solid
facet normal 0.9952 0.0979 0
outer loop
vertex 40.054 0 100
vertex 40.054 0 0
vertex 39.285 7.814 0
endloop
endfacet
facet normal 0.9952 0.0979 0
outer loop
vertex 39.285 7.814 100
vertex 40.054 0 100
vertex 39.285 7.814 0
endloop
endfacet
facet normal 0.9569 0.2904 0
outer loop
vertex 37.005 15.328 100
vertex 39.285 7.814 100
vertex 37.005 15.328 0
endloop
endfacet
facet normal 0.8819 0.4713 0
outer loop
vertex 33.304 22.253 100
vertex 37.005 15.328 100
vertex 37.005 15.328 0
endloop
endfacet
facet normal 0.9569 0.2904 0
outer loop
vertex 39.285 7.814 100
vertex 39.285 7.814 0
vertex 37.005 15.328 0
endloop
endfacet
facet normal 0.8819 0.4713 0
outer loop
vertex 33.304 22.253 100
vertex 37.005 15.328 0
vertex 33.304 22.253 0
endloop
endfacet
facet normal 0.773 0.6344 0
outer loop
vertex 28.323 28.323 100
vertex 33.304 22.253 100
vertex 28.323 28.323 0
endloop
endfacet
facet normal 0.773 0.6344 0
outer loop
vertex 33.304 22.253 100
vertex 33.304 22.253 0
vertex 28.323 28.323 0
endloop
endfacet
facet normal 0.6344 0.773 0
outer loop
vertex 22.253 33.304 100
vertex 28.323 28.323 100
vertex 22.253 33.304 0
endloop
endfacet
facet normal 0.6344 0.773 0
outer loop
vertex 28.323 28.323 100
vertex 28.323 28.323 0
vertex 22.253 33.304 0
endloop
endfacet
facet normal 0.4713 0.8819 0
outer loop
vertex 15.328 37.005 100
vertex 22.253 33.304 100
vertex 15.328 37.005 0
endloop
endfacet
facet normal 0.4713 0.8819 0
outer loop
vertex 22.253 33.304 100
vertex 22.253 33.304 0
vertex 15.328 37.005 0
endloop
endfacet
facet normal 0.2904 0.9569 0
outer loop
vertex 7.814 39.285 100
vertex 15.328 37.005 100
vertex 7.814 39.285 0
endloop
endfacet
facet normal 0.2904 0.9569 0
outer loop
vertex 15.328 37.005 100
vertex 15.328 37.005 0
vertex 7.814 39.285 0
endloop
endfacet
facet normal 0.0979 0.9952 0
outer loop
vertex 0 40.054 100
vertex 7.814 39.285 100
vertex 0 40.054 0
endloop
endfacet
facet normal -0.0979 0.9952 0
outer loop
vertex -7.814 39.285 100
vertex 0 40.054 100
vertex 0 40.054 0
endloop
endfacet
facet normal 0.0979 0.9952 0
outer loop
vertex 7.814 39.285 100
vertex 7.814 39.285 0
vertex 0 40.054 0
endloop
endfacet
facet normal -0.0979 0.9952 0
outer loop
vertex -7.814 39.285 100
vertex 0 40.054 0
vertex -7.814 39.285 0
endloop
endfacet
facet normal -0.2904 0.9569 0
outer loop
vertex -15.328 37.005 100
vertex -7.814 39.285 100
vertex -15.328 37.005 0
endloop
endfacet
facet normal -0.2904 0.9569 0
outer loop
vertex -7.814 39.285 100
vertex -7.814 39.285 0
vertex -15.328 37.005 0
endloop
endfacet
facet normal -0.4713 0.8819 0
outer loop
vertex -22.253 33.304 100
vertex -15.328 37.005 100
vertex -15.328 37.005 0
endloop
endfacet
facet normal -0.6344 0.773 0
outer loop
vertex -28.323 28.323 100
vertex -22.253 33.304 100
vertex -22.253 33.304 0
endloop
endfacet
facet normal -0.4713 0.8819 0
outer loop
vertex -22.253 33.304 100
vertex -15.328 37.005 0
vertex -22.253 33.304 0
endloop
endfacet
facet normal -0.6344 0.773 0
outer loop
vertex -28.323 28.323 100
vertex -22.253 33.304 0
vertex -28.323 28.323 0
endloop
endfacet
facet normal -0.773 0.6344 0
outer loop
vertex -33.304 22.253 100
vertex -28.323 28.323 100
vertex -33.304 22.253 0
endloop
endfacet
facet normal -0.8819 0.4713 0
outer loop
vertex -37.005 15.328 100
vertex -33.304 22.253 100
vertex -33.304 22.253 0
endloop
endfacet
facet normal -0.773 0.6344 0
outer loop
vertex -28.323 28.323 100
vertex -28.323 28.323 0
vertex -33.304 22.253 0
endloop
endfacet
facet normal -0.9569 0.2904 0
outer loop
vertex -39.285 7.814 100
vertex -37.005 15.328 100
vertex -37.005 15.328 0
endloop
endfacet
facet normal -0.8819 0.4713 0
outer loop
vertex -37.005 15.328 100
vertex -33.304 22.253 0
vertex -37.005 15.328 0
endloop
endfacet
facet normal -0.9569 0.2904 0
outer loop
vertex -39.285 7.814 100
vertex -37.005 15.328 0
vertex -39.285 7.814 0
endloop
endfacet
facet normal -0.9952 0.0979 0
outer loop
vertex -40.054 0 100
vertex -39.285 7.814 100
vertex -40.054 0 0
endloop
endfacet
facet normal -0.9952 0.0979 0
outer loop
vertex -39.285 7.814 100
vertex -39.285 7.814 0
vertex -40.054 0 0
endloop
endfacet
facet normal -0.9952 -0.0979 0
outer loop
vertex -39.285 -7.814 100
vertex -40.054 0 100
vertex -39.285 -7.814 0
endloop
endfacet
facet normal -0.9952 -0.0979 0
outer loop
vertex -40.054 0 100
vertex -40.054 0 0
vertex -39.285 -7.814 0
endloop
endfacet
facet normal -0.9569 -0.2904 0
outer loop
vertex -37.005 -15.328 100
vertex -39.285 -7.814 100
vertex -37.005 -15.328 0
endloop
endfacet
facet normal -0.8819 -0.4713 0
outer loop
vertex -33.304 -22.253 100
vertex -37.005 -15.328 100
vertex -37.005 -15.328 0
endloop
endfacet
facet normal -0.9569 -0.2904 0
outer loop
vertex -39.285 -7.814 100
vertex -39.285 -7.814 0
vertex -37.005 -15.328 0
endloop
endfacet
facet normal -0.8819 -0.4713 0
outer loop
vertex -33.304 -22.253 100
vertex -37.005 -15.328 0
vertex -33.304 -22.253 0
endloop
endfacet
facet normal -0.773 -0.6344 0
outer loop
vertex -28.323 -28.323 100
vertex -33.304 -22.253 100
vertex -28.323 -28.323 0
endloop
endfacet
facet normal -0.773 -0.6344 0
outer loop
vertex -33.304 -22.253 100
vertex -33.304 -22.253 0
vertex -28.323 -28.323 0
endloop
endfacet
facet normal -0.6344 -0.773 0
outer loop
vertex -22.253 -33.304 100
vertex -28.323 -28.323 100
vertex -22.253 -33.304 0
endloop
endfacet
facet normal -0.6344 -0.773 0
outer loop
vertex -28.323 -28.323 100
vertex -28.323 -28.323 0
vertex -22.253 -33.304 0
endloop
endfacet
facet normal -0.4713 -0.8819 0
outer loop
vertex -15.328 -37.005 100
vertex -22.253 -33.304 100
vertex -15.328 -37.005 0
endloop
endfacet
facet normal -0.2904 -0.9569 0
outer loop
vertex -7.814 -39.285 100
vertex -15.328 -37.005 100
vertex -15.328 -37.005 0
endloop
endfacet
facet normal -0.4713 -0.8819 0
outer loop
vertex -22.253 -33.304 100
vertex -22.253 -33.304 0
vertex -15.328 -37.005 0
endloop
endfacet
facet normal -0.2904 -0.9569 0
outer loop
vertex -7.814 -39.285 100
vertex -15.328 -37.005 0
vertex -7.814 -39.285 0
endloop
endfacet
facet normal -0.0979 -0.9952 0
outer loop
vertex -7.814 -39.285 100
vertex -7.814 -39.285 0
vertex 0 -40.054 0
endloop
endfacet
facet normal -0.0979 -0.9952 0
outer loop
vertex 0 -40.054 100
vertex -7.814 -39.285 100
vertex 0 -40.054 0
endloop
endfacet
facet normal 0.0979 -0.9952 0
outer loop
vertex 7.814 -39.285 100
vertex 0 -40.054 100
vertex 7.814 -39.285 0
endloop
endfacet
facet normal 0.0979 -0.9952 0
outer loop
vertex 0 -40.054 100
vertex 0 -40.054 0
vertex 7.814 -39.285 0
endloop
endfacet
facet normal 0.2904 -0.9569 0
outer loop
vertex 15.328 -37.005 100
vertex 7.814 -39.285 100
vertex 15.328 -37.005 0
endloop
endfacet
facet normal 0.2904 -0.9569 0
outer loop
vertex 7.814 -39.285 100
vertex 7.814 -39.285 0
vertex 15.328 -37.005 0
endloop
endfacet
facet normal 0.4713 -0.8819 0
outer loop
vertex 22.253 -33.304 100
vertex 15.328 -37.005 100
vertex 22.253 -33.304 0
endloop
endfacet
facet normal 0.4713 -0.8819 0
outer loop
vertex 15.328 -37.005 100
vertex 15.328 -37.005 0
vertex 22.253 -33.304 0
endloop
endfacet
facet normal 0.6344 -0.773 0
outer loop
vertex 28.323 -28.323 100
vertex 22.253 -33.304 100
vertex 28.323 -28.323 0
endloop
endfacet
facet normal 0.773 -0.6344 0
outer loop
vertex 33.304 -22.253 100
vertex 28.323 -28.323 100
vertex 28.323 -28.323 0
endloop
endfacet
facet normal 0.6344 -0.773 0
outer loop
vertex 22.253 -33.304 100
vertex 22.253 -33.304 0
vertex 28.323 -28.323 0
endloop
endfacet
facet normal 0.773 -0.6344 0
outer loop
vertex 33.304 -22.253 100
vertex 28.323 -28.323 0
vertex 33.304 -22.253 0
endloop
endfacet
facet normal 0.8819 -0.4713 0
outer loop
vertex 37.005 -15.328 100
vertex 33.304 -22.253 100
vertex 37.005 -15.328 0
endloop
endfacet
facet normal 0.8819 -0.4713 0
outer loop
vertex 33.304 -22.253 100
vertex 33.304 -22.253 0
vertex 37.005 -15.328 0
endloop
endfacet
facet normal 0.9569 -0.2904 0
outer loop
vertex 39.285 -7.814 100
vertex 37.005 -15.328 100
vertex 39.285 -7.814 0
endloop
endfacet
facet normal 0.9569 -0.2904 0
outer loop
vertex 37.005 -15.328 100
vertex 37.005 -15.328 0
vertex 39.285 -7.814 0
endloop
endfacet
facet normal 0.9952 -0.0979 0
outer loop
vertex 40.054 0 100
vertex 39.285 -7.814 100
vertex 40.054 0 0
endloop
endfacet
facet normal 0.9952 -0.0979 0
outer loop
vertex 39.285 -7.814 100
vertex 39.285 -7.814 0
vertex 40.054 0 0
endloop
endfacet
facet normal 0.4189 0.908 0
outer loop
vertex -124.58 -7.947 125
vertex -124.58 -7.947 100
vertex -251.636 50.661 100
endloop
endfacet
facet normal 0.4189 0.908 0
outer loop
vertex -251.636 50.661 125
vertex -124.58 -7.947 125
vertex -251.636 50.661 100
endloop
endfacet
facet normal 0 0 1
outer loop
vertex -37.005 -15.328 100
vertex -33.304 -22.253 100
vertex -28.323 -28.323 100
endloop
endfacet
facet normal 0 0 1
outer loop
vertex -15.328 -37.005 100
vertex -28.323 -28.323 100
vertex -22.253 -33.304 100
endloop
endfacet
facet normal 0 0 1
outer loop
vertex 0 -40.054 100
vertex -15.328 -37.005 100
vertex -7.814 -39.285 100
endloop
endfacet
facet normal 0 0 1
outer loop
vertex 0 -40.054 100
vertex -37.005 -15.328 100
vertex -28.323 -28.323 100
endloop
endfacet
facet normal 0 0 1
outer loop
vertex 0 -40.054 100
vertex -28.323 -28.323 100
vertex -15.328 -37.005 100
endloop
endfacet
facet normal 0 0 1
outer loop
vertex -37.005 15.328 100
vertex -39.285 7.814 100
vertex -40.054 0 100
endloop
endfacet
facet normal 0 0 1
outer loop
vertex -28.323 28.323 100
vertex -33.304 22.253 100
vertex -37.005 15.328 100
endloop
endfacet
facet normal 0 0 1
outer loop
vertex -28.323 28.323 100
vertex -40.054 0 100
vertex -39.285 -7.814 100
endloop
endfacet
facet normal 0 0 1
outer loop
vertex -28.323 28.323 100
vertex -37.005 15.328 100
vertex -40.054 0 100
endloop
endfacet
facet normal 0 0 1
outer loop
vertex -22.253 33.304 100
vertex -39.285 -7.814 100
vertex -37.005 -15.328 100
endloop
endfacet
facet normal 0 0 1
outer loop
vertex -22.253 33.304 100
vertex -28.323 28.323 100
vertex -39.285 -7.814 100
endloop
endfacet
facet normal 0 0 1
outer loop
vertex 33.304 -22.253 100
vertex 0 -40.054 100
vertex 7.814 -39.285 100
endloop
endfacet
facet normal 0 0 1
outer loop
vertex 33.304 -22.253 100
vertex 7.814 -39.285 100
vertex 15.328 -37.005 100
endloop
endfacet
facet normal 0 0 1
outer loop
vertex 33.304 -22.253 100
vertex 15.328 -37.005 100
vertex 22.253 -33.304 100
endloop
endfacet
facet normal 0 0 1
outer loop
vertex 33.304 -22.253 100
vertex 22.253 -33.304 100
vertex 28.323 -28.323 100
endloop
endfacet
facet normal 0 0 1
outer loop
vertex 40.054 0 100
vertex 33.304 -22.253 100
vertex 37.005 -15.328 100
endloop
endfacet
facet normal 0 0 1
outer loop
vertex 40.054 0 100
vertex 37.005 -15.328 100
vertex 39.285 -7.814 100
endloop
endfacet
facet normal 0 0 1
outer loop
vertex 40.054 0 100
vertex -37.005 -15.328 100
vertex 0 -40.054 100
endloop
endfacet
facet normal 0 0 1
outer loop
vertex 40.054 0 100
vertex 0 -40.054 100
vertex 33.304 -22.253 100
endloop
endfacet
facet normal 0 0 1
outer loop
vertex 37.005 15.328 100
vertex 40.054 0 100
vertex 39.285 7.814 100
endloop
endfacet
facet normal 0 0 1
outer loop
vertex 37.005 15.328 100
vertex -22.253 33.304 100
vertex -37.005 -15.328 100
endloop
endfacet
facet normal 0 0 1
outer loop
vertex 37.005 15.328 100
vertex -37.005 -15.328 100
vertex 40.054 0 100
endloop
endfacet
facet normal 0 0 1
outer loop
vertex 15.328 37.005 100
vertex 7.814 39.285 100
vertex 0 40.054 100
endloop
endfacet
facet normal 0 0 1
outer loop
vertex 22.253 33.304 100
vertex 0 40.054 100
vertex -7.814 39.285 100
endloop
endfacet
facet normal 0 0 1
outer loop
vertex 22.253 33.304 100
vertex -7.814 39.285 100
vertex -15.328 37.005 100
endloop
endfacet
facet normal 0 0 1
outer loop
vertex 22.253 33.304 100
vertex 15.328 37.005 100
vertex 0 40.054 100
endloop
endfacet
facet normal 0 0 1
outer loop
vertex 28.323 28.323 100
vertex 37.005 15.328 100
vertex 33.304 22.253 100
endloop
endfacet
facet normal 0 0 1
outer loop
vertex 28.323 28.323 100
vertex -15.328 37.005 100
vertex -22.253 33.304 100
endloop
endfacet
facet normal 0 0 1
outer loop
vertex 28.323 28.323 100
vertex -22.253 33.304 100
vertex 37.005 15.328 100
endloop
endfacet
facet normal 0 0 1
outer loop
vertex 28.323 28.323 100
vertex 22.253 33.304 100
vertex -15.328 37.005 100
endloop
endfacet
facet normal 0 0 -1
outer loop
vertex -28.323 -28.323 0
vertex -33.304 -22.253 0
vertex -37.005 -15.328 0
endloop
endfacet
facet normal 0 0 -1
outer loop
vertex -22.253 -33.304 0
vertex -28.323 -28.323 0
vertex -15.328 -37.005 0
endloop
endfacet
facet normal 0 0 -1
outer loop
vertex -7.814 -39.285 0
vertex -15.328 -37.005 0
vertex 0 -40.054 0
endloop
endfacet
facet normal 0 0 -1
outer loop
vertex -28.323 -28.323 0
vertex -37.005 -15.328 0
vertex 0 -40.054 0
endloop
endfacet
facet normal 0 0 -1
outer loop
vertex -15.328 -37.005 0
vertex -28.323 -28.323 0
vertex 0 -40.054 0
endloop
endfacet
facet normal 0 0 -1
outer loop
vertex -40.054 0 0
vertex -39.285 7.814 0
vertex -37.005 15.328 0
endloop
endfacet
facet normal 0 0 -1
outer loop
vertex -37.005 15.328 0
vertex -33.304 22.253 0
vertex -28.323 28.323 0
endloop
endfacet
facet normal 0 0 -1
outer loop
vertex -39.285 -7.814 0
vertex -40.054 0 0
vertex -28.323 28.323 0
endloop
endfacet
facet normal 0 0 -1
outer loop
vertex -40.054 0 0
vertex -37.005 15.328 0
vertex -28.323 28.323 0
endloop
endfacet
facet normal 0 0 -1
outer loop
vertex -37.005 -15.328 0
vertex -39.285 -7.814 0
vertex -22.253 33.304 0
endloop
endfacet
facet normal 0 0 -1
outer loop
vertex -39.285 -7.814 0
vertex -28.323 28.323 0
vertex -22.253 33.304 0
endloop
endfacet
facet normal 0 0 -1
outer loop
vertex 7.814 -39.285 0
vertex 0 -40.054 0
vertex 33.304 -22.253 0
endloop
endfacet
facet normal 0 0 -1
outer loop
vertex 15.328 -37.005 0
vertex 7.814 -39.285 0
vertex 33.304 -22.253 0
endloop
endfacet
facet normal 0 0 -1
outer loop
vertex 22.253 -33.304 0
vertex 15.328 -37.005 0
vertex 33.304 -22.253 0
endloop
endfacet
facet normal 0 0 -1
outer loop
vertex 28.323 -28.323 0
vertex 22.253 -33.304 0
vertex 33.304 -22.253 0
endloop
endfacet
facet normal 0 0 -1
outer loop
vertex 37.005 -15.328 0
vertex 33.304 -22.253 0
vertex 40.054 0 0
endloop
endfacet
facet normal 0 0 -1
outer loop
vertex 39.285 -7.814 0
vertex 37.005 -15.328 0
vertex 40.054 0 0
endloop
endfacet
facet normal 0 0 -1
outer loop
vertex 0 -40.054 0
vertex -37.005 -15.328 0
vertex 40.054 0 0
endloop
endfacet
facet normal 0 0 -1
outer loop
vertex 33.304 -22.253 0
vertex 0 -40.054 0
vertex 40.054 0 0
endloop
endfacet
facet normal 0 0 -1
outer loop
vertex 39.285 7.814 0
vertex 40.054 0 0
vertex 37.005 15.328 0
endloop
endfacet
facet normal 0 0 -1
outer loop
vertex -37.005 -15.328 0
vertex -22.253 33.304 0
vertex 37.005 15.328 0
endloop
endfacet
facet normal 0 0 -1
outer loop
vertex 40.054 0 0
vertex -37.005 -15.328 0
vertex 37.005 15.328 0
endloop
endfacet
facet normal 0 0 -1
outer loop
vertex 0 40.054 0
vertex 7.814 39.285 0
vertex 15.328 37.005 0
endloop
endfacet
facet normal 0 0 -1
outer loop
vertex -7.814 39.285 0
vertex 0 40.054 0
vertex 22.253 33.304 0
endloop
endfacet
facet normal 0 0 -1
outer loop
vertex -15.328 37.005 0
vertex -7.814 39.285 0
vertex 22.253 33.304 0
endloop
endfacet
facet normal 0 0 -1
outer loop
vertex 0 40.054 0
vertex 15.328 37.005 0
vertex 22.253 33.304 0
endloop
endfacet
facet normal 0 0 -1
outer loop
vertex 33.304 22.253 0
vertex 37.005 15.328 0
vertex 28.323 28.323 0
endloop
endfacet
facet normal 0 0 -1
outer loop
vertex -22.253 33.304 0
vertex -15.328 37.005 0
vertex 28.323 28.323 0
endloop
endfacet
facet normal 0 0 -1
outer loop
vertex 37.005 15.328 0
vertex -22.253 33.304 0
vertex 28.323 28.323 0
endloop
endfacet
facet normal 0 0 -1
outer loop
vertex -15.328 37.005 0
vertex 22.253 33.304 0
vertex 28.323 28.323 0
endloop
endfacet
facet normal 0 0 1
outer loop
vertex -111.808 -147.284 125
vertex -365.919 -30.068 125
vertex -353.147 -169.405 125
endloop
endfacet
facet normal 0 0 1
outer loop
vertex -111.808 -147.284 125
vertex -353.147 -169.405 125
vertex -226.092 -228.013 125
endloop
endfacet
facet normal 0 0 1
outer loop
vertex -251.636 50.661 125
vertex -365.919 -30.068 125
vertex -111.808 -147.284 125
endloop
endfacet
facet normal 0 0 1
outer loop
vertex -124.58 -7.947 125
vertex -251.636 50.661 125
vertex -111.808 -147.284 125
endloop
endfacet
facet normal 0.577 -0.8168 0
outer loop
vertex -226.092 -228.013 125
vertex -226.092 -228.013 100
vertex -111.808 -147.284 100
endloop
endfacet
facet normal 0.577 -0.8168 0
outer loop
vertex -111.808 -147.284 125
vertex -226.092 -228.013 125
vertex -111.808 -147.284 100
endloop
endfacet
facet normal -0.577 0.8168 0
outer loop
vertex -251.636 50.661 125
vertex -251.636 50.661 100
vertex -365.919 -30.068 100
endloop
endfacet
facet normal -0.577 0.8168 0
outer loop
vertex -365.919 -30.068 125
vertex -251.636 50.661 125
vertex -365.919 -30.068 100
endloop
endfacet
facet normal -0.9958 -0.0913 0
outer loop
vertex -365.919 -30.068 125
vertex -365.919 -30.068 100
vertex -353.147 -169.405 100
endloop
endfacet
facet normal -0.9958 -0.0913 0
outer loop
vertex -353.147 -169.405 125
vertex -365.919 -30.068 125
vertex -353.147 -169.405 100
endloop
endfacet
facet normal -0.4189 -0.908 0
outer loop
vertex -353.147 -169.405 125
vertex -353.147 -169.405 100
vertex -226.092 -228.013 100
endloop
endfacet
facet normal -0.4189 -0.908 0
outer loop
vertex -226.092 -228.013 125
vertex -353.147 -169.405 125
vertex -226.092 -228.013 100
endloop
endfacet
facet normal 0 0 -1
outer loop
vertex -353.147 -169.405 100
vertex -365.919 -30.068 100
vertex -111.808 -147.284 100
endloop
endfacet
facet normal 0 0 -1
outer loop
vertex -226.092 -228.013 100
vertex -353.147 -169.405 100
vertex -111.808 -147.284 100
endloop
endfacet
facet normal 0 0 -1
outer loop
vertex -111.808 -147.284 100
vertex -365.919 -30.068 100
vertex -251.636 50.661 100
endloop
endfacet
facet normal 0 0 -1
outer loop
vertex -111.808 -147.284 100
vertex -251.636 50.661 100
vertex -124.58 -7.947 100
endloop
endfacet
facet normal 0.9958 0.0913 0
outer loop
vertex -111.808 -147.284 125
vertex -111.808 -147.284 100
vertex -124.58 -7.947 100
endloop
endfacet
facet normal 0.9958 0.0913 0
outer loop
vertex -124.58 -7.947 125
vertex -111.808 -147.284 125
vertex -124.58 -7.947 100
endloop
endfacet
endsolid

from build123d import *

# Parameters (mm, degrees)
F0_R     = 40.054359
F1_DEPTH = 100
F4_DEPTH = 25


with BuildPart() as f1:
    # F0 (on Top) → F1 (new body)
    with BuildSketch(Plane.XY):
        Circle(F0_R)
    extrude(amount=F1_DEPTH)


with BuildPart() as f4:
    # F3 (on face) → F4 (new body)
    with BuildSketch(Plane.XY.offset(100)):
        Polygon((-365.919222, -30.067974), (-353.147447, -169.405207), (-226.091976, -228.013142), (-111.80828, -147.283843), (-124.580055, -7.94661), (-251.635527, 50.661324), align=None)
    extrude(amount=F4_DEPTH)


solid = Compound([f1.part, f4.part])
